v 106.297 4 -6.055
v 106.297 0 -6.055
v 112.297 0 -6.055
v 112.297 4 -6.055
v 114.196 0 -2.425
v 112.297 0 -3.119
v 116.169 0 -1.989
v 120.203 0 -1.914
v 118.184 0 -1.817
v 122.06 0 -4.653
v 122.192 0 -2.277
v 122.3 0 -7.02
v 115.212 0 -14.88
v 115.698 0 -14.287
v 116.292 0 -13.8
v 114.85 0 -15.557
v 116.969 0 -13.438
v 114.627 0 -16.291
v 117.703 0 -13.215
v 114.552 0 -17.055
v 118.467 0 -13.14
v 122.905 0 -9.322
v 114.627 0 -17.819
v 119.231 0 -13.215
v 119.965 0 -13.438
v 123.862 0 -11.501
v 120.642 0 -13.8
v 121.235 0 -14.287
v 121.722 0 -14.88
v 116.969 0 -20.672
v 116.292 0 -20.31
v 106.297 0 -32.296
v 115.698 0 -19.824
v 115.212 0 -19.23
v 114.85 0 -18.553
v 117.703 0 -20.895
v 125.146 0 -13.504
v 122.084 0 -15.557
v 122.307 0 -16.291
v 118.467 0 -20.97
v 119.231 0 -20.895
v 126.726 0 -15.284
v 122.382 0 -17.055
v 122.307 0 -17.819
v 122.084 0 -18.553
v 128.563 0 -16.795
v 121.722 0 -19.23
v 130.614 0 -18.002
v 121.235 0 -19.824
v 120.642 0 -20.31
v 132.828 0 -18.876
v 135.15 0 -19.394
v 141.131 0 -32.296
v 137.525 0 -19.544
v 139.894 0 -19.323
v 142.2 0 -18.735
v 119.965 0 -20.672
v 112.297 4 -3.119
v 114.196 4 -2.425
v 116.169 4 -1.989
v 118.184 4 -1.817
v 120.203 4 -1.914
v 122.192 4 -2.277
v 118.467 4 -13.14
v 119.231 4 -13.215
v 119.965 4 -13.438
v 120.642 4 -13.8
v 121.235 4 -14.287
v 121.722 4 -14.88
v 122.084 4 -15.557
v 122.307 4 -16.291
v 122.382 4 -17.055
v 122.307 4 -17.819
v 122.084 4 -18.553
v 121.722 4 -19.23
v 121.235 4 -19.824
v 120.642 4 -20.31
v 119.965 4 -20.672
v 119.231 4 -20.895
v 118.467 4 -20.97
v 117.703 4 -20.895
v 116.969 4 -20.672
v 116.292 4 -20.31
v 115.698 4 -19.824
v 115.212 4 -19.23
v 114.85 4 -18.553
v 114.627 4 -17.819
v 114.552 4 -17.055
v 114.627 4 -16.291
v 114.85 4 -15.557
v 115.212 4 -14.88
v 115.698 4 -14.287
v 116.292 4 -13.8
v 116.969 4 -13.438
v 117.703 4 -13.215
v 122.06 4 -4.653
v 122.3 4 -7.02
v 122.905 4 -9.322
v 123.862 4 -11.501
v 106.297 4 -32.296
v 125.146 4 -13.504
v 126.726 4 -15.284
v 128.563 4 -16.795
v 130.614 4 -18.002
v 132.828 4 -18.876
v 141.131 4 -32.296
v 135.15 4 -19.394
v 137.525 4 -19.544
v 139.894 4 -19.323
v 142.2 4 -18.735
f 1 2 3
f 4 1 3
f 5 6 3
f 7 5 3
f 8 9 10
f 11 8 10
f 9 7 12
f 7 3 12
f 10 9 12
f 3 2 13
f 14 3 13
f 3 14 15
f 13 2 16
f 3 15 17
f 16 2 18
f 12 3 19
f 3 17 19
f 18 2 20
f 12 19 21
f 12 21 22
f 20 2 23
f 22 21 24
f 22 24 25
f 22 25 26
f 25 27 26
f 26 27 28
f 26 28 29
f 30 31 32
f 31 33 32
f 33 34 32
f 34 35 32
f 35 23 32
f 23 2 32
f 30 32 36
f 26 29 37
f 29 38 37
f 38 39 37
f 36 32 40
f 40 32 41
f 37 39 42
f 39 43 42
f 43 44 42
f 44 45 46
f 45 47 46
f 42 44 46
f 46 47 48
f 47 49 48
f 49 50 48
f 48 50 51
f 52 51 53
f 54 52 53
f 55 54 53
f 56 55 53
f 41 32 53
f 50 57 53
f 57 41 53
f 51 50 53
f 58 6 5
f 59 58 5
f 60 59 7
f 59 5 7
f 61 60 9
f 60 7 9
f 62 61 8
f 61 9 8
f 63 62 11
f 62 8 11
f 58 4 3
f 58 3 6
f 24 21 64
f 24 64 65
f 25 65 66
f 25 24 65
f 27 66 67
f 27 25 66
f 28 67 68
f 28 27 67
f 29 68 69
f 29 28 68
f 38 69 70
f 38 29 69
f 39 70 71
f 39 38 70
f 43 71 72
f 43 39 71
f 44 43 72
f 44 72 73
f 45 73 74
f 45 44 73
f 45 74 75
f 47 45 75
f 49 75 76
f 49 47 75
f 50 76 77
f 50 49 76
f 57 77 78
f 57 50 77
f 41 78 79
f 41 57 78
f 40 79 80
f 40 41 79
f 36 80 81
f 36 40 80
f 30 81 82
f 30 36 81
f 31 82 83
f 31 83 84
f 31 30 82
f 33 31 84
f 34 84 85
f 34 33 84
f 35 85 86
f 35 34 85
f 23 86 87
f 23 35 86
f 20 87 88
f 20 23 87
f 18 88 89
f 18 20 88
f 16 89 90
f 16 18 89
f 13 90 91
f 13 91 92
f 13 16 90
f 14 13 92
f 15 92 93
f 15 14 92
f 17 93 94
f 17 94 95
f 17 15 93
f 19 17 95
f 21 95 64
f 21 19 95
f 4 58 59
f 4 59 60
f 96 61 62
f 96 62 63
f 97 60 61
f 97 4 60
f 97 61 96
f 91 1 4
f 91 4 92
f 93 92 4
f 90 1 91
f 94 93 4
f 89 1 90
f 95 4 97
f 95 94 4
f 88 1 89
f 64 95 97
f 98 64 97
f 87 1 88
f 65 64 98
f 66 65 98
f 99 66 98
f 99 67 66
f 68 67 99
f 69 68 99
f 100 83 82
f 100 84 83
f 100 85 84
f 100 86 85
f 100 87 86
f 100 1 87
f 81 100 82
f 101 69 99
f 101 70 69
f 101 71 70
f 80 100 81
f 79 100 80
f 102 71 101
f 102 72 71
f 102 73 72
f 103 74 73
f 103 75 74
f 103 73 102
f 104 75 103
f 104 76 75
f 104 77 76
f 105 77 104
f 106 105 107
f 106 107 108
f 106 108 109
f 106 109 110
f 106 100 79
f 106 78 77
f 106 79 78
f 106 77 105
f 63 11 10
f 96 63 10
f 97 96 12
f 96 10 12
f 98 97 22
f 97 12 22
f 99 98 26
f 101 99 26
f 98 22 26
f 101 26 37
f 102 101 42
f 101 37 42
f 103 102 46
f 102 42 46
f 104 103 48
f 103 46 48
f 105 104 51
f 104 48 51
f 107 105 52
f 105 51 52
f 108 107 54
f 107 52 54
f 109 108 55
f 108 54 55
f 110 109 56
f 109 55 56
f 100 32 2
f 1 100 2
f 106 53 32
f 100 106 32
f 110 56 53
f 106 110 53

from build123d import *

# Parameters (mm, degrees)
SKETCH1_R           = 3.915
BOSS_EXTRUDE1_DEPTH = 4


with BuildPart() as part:
    # Sketch1 → Boss-Extrude1 (new body)
    with BuildSketch(Plane(origin=(0, 0, 0), x_dir=(1, 0, 0), z_dir=(0, 1, 0))):
        with BuildLine():
            Line((112.296761578, 6.055177331), (112.296761578, 3.119444466))
            ThreePointArc((112.296761578, 3.119444466), (117.173733569, 1.869604275), (122.191807827, 2.276896615))
            ThreePointArc((122.191807827, 2.276896615), (127.614961562, 16.075321721), (142.200280719, 18.735321146))
            Line((142.200280719, 18.735321146), (141.13131283, 32.295700632))
            Line((141.13131283, 32.295700632), (106.296761578, 32.295700632))
            Line((106.296761578, 32.295700632), (106.296761578, 6.055177331))
            Line((106.296761578, 6.055177331), (112.296761578, 6.055177331))
        make_face()
        with Locations((118.466761578, 17.055177331)):
            Circle(SKETCH1_R, mode=Mode.SUBTRACT)
    extrude(amount=BOSS_EXTRUDE1_DEPTH)


solid = part.part
